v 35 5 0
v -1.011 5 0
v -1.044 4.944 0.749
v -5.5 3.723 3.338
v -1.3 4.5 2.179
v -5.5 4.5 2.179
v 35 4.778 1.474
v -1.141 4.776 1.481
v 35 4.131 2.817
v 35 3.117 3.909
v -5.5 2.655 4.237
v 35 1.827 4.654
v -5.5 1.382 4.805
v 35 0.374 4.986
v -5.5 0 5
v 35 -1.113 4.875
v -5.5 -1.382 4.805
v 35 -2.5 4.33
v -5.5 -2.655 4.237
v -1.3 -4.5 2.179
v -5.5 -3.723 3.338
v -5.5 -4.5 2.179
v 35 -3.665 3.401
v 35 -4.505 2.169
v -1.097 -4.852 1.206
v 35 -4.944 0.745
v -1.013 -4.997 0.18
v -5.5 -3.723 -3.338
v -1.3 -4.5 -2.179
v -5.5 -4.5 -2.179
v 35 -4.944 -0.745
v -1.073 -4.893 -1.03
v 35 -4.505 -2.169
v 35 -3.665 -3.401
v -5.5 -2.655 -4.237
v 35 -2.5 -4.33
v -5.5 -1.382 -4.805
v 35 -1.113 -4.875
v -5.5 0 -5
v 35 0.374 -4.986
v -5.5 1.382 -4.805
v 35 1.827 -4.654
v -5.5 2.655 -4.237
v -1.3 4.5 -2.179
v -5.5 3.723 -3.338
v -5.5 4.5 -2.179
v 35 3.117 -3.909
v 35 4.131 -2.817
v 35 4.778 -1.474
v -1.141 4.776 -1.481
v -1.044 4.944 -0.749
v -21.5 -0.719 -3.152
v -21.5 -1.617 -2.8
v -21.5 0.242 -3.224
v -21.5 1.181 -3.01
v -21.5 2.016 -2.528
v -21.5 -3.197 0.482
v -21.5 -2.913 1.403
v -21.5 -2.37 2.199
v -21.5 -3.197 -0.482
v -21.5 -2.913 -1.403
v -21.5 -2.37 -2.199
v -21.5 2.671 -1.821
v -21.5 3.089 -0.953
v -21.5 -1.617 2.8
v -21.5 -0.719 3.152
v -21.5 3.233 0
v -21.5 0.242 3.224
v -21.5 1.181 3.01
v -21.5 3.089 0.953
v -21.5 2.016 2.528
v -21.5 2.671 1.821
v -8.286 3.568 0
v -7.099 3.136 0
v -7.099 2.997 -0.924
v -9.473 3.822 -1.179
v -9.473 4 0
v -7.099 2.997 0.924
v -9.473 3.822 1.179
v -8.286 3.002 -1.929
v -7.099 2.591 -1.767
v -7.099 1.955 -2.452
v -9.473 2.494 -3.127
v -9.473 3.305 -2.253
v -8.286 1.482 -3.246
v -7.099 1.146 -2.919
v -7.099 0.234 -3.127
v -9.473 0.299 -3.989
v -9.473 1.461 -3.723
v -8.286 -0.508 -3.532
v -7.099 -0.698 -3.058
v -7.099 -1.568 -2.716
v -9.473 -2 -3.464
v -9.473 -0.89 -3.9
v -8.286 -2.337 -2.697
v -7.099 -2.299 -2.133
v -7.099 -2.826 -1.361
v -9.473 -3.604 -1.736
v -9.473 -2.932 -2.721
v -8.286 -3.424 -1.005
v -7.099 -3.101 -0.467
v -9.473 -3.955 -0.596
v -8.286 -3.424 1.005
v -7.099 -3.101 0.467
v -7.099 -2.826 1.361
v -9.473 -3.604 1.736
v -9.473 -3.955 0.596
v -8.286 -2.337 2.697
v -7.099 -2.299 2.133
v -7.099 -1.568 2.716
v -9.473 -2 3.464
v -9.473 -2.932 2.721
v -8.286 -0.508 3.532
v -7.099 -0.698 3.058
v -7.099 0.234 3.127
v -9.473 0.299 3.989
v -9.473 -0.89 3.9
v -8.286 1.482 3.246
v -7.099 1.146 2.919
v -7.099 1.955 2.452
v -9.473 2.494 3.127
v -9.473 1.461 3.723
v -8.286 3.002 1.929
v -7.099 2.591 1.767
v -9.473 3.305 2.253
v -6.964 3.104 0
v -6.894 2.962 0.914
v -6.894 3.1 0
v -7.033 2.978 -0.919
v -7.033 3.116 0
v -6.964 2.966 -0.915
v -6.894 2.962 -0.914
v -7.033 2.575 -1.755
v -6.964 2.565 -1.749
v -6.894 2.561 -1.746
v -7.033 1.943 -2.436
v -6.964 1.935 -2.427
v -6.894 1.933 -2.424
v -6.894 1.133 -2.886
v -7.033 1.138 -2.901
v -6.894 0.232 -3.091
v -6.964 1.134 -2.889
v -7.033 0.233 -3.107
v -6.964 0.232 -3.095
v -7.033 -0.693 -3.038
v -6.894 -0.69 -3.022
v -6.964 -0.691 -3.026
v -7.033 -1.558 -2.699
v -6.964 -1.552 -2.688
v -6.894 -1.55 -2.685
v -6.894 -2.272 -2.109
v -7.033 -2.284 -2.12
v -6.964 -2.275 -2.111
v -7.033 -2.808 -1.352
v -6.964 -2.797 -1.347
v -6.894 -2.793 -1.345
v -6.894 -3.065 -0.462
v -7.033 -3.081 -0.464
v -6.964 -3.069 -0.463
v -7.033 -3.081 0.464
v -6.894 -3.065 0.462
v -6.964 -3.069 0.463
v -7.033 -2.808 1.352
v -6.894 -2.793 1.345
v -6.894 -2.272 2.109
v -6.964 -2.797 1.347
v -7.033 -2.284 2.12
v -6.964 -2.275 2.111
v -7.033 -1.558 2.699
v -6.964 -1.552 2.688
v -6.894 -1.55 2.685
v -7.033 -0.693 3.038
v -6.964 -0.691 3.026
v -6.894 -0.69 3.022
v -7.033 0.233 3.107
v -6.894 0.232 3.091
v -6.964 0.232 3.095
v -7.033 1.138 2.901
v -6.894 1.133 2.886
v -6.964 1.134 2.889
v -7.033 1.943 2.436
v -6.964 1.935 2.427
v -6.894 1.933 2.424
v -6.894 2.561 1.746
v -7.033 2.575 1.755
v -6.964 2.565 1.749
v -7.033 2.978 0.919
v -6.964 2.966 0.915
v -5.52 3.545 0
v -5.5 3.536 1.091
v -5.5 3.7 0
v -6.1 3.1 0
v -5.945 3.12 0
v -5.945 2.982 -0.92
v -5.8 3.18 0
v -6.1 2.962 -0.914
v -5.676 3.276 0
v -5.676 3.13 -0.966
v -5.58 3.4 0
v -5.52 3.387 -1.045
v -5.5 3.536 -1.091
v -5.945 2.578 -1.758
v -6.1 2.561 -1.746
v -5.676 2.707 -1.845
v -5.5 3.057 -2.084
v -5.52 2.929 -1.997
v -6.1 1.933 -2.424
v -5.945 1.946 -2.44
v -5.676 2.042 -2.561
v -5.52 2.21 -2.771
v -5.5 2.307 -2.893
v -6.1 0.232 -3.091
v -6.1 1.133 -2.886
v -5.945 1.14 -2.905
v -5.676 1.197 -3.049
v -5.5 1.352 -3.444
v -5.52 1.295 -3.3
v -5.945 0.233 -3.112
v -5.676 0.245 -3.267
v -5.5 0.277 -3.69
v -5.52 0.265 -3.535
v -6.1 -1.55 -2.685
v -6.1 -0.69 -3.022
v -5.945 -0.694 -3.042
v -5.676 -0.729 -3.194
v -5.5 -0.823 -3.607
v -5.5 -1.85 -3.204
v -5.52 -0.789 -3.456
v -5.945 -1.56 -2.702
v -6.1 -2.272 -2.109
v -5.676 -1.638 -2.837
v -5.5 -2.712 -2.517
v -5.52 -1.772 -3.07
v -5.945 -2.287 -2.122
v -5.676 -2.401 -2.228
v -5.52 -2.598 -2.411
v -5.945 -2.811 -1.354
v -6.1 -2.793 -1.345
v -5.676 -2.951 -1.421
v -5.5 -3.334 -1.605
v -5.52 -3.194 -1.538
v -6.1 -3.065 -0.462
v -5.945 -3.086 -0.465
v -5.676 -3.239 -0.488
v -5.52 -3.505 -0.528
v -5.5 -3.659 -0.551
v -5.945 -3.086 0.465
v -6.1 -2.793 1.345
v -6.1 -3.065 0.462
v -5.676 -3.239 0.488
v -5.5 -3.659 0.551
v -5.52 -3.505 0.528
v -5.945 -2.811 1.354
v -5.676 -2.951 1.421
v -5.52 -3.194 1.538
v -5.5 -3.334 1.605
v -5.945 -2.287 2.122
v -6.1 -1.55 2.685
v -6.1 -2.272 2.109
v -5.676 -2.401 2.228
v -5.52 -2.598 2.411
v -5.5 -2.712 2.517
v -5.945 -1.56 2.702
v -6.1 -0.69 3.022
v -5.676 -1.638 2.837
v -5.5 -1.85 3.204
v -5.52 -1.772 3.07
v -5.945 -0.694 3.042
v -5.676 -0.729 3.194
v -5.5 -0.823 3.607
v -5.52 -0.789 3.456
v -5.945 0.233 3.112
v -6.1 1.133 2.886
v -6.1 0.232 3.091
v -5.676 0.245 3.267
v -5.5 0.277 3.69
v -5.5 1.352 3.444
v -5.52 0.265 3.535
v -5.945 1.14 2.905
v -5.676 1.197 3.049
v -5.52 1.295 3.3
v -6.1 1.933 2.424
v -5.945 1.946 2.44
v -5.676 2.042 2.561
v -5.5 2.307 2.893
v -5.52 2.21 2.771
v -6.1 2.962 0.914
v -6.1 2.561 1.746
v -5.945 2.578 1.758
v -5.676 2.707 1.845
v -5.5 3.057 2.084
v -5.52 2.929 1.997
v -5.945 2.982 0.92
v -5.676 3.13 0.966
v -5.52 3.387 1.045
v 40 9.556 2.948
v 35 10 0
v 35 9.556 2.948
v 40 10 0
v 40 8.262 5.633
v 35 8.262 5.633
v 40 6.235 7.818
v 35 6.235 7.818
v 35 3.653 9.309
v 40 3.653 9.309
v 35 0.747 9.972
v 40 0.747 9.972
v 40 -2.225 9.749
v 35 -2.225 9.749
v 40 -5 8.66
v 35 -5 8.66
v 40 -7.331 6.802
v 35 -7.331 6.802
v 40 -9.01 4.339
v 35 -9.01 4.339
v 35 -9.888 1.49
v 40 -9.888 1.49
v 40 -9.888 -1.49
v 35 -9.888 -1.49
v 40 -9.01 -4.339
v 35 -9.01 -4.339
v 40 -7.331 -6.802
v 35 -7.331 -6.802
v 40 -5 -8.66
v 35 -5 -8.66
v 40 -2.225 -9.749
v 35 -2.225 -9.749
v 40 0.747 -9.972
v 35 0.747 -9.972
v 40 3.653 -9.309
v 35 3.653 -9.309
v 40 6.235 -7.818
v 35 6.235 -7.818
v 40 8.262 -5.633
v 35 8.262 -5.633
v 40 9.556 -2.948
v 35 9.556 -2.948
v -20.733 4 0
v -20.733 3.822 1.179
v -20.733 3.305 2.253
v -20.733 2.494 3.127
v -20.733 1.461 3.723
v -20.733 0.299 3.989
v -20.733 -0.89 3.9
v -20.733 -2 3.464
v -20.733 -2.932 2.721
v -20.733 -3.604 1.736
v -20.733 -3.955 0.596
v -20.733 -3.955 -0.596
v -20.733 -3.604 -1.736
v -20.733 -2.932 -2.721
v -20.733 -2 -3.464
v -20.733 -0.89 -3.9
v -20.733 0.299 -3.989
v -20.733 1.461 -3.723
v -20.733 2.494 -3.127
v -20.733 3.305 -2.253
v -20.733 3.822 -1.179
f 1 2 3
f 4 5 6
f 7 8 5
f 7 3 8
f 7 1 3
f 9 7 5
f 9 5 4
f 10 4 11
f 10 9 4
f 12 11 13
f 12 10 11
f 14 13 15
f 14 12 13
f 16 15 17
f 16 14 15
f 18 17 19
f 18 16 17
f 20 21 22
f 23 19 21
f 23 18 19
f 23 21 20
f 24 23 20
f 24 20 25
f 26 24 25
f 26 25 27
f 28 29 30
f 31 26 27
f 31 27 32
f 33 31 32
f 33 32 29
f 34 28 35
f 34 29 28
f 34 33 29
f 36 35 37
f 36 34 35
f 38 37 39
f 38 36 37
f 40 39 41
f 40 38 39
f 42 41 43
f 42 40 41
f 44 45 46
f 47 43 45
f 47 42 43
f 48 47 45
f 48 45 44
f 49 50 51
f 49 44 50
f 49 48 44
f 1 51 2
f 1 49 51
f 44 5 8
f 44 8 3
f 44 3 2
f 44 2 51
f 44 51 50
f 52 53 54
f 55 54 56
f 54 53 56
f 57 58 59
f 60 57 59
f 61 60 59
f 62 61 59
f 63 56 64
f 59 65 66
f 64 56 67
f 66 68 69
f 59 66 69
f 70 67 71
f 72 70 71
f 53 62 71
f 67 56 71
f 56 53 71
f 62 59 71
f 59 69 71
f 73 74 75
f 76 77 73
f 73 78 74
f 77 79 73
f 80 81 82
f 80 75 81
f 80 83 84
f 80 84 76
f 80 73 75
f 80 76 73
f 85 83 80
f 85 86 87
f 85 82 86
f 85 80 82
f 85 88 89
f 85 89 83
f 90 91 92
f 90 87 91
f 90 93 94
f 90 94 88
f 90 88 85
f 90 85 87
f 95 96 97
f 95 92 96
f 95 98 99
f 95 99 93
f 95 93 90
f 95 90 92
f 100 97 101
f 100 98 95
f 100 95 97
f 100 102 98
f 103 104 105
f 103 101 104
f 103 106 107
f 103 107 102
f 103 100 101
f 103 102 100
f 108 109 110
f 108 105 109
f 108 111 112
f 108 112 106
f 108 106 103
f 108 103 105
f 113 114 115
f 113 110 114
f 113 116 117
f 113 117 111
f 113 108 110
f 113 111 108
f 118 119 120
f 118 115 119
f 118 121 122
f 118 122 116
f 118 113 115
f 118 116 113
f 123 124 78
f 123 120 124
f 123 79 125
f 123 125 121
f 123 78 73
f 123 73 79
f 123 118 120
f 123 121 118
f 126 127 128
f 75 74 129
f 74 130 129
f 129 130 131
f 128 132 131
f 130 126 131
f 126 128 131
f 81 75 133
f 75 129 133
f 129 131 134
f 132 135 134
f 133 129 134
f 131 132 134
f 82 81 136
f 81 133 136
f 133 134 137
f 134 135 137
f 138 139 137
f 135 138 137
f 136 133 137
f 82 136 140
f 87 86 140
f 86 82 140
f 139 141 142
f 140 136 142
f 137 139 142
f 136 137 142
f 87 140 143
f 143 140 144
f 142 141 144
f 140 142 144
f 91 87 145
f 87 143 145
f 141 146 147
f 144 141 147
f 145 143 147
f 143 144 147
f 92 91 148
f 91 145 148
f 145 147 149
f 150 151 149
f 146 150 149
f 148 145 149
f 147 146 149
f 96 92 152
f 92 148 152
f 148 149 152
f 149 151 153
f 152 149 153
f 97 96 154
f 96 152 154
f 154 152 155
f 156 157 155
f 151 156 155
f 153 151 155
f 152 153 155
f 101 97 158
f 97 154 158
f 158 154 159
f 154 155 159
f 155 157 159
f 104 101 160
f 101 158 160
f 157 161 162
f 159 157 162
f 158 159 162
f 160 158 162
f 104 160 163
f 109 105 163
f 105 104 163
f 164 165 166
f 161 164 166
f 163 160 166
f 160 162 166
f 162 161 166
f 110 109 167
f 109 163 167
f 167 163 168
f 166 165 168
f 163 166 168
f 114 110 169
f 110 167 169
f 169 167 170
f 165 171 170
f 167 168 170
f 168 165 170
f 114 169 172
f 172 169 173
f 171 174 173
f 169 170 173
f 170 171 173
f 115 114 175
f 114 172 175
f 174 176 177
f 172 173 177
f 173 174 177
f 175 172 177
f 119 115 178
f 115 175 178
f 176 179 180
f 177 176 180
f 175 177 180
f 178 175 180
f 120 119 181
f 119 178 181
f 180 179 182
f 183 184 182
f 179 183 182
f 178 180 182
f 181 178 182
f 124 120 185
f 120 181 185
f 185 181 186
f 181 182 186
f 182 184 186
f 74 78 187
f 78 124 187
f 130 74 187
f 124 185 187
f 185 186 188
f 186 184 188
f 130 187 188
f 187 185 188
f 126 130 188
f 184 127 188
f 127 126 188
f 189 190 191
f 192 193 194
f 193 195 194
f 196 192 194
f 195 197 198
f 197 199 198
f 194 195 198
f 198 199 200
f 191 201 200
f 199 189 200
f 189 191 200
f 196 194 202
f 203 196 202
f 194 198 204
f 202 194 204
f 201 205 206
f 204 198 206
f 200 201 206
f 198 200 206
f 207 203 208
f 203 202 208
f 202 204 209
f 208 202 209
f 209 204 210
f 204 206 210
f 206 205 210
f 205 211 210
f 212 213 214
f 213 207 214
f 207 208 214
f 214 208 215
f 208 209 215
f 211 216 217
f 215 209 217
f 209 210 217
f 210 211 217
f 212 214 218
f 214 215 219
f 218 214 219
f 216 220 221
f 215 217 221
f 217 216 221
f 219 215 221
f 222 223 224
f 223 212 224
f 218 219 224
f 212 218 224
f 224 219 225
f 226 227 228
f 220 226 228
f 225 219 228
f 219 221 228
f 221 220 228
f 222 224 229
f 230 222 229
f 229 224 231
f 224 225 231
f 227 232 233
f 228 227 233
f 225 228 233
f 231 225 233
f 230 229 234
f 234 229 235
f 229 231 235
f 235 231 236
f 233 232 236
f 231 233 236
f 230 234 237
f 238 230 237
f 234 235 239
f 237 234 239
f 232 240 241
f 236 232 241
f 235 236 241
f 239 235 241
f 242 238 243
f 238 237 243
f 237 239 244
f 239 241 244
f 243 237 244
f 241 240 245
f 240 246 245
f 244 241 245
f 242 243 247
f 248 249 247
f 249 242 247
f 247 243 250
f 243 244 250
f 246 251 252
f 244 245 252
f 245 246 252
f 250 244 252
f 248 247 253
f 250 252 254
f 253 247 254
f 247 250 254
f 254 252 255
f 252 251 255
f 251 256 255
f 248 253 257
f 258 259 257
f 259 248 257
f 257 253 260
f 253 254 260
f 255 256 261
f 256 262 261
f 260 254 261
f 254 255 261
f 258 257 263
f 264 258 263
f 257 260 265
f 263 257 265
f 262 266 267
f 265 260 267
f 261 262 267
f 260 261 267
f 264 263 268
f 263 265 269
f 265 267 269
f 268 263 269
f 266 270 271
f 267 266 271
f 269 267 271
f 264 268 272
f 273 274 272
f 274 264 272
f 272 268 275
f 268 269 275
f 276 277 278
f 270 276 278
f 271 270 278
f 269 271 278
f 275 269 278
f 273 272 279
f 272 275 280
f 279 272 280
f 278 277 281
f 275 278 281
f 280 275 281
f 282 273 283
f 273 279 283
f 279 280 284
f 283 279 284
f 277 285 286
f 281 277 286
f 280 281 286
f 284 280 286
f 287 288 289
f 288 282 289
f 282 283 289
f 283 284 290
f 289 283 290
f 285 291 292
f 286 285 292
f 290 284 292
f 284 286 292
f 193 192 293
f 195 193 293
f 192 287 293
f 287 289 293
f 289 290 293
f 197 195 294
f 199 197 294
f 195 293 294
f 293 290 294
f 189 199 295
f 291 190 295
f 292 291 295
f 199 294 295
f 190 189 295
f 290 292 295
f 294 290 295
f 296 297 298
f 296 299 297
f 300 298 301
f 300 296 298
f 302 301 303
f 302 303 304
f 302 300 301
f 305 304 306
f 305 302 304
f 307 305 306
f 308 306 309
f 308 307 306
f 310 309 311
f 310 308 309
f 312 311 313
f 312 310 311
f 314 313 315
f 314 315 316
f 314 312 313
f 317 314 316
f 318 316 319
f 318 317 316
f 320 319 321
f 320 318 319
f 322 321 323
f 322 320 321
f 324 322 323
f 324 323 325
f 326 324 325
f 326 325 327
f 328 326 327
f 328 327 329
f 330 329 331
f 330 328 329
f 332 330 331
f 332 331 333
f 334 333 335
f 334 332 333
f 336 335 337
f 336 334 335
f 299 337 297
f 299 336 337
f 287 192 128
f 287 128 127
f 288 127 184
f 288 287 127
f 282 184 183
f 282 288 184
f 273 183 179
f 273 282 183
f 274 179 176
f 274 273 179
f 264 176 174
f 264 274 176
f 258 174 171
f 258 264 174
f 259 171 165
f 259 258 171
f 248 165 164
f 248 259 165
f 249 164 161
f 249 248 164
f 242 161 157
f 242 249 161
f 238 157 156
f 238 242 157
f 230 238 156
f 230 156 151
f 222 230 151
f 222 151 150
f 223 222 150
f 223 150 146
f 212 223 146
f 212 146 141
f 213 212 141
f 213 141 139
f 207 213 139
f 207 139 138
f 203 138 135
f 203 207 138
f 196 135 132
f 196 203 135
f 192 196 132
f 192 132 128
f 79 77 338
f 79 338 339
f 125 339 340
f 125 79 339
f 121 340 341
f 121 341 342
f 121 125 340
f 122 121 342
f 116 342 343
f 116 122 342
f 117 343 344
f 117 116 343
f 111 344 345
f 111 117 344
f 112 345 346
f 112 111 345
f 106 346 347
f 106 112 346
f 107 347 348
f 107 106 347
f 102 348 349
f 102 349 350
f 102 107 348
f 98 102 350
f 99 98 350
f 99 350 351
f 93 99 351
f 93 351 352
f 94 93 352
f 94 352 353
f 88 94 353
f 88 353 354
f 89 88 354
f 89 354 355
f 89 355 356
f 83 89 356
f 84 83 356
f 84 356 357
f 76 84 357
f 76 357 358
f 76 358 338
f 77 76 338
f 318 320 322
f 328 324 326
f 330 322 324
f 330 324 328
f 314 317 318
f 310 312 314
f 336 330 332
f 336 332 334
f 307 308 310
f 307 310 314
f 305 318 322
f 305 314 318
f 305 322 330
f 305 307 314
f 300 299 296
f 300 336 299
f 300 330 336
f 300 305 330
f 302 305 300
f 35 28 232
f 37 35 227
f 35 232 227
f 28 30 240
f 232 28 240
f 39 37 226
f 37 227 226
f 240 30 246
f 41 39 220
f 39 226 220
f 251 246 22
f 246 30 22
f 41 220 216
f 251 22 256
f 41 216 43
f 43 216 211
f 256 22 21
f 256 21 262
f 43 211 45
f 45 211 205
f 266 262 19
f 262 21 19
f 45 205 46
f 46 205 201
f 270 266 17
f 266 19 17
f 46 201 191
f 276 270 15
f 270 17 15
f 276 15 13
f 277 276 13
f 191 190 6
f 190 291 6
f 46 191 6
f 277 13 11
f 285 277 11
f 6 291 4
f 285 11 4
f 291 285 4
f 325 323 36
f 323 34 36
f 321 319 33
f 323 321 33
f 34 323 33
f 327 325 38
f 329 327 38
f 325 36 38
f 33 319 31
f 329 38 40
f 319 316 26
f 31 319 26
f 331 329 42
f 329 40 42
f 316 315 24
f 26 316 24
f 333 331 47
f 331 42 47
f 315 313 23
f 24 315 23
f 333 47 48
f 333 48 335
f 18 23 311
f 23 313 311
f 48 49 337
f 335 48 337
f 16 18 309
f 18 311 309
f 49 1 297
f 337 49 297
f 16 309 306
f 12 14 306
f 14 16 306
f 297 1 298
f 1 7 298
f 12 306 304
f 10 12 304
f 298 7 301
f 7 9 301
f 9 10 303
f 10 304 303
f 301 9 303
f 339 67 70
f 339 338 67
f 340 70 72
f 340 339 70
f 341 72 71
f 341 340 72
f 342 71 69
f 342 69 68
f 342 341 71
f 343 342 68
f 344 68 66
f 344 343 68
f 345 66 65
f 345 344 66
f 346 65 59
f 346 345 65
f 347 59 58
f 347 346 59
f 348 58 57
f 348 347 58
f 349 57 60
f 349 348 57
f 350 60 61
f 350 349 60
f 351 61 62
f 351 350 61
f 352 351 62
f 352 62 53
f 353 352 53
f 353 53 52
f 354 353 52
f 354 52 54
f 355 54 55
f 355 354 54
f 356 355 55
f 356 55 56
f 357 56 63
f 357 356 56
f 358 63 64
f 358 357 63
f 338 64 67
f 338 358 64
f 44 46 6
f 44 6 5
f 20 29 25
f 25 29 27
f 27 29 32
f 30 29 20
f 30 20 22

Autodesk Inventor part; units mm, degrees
sketch "Sketch_1" plane through (0, 0, 0) normal (0, 0, 1) x (1, 0, 0)
  line L0 (40, 0) -> (-5.5, 0)
  line L1 (-5.5, 0) -> (-5.5, 5)
  line L2 (-5.5, 5) -> (40, 5)
  line L3 (40, 5) -> (40, 0)
  line L4 (40, 0) -> (-5.5, 0)
revolve "Revolution1" add sketch "Sketch_1" angle 360 about axis through (40, 0, 0) along (1, 0, 0)
sketch "Sketch_11" plane through (0, 0, 0) normal (0, 0, 1) x (1, 0, 0)
  line L0 (40, 0) -> (35, 0)
  line L1 (35, 0) -> (35, 10)
  line L2 (35, 10) -> (40, 10)
  line L3 (40, 10) -> (40, 0)
  line L4 (40, 0) -> (35, 0)
revolve "Revolution2" add sketch "Sketch_11" angle 360 about axis through (40, 0, 0) along (1, 0, 0)
sketch "Sketch_19" plane through (0, 0, 0) normal (0, 0, 1) x (1, 0, 0)
  line L0 (-4.5, 0) -> (-21.5, 0)
  line L1 (-21.5, 0) -> (-21.5, 3.233)
  line L2 (-21.5, 3.233) -> (-20.733, 4)
  line L3 (-20.733, 4) -> (-9.4727, 4)
  line L4 (-9.4727, 4) -> (-7.0994, 3.1362)
  arc A0 (-7.0994, 3.1362) -> (-6.8942, 3.1) centre (-6.8942, 3.7) ccw
  line L5 (-6.8942, 3.1) -> (-6.1, 3.1)
  arc A1 (-6.1, 3.1) -> (-5.5, 3.7) centre (-6.1, 3.7) ccw
  line L6 (-5.5, 3.7) -> (-5.5, 4)
  line L7 (-5.5, 4) -> (-4.5, 4)
  line L8 (-4.5, 4) -> (-4.5, 0)
  line L9 (-4.5, 0) -> (-21.5, 0)
revolve "Revolution3" add sketch "Sketch_19" angle 360 about axis through (-4.5, 0, 0) along (1, 0, 0)
thread "Thread1" size "M8x1.25" class "6g" standard "ISO Metric profile" full length
sketch "Sketch_20" plane through (0, 0, 0) normal (0, 0, 1) x (1, 0, 0)
  line L0 (-32, -14.5) -> (4.4735, -14.5)
  line L1 (4.4735, -14.5) -> (-1.3, -4.5)
  line L2 (-1.3, -4.5) -> (-5.5, -4.5)
  line L3 (-5.5, -4.5) -> (-5.5, -9.5)
  line L4 (-5.5, -9.5) -> (-26.5, -9.5)
  line L5 (-26.5, -9.5) -> (-26.5, 9.5)
  line L6 (-26.5, 9.5) -> (-5.5, 9.5)
  line L7 (-5.5, 9.5) -> (-5.5, 4.5)
  line L8 (-5.5, 4.5) -> (-1.3, 4.5)
  line L9 (-1.3, 4.5) -> (4.4735, 14.5)
  line L10 (4.4735, 14.5) -> (-32, 14.5)
  line L11 (-32, 14.5) -> (-32, -14.5)
extrude "Extrusion1" cut sketch "Sketch_20" along normal mid plane 20
ref_plane "FDT_PIRODACC_M1_XY" through (-13.5, 0, 0) normal (-1, 0, 0) x (0, 1, 0)
ref_plane "FDT_PIRODACC_M1_YZ" through (-13.5, 0, 0) normal (0, 1, 0) x (0, 0, -1)
ref_plane "FDT_PIRODACC_M1_ZX" through (-13.5, 0, 0) normal (0, 0, -1) x (-1, 0, 0)
ref_plane "NUT1_XY" through (-11.5, 0, 0) normal (1, 0, 0) x (0, 0, -1)
ref_plane "NUT1_YZ" through (-11.5, 0, 0) normal (0, 0, -1) x (0, 1, 0)
ref_plane "NUT1_ZX" through (-11.5, 0, 0) normal (0, 1, 0) x (1, 0, 0)
ref_plane "PISTON_XY" through (40, 0, 0) normal (1, 0, 0) x (0, 0, -1)
ref_plane "PISTON_YZ" through (40, 0, 0) normal (0, 0, -1) x (0, 1, 0)
ref_plane "PISTON_ZX" through (40, 0, 0) normal (0, 1, 0) x (1, 0, 0)
properties part number "536233 ADN-15-P-A_(KS)"
